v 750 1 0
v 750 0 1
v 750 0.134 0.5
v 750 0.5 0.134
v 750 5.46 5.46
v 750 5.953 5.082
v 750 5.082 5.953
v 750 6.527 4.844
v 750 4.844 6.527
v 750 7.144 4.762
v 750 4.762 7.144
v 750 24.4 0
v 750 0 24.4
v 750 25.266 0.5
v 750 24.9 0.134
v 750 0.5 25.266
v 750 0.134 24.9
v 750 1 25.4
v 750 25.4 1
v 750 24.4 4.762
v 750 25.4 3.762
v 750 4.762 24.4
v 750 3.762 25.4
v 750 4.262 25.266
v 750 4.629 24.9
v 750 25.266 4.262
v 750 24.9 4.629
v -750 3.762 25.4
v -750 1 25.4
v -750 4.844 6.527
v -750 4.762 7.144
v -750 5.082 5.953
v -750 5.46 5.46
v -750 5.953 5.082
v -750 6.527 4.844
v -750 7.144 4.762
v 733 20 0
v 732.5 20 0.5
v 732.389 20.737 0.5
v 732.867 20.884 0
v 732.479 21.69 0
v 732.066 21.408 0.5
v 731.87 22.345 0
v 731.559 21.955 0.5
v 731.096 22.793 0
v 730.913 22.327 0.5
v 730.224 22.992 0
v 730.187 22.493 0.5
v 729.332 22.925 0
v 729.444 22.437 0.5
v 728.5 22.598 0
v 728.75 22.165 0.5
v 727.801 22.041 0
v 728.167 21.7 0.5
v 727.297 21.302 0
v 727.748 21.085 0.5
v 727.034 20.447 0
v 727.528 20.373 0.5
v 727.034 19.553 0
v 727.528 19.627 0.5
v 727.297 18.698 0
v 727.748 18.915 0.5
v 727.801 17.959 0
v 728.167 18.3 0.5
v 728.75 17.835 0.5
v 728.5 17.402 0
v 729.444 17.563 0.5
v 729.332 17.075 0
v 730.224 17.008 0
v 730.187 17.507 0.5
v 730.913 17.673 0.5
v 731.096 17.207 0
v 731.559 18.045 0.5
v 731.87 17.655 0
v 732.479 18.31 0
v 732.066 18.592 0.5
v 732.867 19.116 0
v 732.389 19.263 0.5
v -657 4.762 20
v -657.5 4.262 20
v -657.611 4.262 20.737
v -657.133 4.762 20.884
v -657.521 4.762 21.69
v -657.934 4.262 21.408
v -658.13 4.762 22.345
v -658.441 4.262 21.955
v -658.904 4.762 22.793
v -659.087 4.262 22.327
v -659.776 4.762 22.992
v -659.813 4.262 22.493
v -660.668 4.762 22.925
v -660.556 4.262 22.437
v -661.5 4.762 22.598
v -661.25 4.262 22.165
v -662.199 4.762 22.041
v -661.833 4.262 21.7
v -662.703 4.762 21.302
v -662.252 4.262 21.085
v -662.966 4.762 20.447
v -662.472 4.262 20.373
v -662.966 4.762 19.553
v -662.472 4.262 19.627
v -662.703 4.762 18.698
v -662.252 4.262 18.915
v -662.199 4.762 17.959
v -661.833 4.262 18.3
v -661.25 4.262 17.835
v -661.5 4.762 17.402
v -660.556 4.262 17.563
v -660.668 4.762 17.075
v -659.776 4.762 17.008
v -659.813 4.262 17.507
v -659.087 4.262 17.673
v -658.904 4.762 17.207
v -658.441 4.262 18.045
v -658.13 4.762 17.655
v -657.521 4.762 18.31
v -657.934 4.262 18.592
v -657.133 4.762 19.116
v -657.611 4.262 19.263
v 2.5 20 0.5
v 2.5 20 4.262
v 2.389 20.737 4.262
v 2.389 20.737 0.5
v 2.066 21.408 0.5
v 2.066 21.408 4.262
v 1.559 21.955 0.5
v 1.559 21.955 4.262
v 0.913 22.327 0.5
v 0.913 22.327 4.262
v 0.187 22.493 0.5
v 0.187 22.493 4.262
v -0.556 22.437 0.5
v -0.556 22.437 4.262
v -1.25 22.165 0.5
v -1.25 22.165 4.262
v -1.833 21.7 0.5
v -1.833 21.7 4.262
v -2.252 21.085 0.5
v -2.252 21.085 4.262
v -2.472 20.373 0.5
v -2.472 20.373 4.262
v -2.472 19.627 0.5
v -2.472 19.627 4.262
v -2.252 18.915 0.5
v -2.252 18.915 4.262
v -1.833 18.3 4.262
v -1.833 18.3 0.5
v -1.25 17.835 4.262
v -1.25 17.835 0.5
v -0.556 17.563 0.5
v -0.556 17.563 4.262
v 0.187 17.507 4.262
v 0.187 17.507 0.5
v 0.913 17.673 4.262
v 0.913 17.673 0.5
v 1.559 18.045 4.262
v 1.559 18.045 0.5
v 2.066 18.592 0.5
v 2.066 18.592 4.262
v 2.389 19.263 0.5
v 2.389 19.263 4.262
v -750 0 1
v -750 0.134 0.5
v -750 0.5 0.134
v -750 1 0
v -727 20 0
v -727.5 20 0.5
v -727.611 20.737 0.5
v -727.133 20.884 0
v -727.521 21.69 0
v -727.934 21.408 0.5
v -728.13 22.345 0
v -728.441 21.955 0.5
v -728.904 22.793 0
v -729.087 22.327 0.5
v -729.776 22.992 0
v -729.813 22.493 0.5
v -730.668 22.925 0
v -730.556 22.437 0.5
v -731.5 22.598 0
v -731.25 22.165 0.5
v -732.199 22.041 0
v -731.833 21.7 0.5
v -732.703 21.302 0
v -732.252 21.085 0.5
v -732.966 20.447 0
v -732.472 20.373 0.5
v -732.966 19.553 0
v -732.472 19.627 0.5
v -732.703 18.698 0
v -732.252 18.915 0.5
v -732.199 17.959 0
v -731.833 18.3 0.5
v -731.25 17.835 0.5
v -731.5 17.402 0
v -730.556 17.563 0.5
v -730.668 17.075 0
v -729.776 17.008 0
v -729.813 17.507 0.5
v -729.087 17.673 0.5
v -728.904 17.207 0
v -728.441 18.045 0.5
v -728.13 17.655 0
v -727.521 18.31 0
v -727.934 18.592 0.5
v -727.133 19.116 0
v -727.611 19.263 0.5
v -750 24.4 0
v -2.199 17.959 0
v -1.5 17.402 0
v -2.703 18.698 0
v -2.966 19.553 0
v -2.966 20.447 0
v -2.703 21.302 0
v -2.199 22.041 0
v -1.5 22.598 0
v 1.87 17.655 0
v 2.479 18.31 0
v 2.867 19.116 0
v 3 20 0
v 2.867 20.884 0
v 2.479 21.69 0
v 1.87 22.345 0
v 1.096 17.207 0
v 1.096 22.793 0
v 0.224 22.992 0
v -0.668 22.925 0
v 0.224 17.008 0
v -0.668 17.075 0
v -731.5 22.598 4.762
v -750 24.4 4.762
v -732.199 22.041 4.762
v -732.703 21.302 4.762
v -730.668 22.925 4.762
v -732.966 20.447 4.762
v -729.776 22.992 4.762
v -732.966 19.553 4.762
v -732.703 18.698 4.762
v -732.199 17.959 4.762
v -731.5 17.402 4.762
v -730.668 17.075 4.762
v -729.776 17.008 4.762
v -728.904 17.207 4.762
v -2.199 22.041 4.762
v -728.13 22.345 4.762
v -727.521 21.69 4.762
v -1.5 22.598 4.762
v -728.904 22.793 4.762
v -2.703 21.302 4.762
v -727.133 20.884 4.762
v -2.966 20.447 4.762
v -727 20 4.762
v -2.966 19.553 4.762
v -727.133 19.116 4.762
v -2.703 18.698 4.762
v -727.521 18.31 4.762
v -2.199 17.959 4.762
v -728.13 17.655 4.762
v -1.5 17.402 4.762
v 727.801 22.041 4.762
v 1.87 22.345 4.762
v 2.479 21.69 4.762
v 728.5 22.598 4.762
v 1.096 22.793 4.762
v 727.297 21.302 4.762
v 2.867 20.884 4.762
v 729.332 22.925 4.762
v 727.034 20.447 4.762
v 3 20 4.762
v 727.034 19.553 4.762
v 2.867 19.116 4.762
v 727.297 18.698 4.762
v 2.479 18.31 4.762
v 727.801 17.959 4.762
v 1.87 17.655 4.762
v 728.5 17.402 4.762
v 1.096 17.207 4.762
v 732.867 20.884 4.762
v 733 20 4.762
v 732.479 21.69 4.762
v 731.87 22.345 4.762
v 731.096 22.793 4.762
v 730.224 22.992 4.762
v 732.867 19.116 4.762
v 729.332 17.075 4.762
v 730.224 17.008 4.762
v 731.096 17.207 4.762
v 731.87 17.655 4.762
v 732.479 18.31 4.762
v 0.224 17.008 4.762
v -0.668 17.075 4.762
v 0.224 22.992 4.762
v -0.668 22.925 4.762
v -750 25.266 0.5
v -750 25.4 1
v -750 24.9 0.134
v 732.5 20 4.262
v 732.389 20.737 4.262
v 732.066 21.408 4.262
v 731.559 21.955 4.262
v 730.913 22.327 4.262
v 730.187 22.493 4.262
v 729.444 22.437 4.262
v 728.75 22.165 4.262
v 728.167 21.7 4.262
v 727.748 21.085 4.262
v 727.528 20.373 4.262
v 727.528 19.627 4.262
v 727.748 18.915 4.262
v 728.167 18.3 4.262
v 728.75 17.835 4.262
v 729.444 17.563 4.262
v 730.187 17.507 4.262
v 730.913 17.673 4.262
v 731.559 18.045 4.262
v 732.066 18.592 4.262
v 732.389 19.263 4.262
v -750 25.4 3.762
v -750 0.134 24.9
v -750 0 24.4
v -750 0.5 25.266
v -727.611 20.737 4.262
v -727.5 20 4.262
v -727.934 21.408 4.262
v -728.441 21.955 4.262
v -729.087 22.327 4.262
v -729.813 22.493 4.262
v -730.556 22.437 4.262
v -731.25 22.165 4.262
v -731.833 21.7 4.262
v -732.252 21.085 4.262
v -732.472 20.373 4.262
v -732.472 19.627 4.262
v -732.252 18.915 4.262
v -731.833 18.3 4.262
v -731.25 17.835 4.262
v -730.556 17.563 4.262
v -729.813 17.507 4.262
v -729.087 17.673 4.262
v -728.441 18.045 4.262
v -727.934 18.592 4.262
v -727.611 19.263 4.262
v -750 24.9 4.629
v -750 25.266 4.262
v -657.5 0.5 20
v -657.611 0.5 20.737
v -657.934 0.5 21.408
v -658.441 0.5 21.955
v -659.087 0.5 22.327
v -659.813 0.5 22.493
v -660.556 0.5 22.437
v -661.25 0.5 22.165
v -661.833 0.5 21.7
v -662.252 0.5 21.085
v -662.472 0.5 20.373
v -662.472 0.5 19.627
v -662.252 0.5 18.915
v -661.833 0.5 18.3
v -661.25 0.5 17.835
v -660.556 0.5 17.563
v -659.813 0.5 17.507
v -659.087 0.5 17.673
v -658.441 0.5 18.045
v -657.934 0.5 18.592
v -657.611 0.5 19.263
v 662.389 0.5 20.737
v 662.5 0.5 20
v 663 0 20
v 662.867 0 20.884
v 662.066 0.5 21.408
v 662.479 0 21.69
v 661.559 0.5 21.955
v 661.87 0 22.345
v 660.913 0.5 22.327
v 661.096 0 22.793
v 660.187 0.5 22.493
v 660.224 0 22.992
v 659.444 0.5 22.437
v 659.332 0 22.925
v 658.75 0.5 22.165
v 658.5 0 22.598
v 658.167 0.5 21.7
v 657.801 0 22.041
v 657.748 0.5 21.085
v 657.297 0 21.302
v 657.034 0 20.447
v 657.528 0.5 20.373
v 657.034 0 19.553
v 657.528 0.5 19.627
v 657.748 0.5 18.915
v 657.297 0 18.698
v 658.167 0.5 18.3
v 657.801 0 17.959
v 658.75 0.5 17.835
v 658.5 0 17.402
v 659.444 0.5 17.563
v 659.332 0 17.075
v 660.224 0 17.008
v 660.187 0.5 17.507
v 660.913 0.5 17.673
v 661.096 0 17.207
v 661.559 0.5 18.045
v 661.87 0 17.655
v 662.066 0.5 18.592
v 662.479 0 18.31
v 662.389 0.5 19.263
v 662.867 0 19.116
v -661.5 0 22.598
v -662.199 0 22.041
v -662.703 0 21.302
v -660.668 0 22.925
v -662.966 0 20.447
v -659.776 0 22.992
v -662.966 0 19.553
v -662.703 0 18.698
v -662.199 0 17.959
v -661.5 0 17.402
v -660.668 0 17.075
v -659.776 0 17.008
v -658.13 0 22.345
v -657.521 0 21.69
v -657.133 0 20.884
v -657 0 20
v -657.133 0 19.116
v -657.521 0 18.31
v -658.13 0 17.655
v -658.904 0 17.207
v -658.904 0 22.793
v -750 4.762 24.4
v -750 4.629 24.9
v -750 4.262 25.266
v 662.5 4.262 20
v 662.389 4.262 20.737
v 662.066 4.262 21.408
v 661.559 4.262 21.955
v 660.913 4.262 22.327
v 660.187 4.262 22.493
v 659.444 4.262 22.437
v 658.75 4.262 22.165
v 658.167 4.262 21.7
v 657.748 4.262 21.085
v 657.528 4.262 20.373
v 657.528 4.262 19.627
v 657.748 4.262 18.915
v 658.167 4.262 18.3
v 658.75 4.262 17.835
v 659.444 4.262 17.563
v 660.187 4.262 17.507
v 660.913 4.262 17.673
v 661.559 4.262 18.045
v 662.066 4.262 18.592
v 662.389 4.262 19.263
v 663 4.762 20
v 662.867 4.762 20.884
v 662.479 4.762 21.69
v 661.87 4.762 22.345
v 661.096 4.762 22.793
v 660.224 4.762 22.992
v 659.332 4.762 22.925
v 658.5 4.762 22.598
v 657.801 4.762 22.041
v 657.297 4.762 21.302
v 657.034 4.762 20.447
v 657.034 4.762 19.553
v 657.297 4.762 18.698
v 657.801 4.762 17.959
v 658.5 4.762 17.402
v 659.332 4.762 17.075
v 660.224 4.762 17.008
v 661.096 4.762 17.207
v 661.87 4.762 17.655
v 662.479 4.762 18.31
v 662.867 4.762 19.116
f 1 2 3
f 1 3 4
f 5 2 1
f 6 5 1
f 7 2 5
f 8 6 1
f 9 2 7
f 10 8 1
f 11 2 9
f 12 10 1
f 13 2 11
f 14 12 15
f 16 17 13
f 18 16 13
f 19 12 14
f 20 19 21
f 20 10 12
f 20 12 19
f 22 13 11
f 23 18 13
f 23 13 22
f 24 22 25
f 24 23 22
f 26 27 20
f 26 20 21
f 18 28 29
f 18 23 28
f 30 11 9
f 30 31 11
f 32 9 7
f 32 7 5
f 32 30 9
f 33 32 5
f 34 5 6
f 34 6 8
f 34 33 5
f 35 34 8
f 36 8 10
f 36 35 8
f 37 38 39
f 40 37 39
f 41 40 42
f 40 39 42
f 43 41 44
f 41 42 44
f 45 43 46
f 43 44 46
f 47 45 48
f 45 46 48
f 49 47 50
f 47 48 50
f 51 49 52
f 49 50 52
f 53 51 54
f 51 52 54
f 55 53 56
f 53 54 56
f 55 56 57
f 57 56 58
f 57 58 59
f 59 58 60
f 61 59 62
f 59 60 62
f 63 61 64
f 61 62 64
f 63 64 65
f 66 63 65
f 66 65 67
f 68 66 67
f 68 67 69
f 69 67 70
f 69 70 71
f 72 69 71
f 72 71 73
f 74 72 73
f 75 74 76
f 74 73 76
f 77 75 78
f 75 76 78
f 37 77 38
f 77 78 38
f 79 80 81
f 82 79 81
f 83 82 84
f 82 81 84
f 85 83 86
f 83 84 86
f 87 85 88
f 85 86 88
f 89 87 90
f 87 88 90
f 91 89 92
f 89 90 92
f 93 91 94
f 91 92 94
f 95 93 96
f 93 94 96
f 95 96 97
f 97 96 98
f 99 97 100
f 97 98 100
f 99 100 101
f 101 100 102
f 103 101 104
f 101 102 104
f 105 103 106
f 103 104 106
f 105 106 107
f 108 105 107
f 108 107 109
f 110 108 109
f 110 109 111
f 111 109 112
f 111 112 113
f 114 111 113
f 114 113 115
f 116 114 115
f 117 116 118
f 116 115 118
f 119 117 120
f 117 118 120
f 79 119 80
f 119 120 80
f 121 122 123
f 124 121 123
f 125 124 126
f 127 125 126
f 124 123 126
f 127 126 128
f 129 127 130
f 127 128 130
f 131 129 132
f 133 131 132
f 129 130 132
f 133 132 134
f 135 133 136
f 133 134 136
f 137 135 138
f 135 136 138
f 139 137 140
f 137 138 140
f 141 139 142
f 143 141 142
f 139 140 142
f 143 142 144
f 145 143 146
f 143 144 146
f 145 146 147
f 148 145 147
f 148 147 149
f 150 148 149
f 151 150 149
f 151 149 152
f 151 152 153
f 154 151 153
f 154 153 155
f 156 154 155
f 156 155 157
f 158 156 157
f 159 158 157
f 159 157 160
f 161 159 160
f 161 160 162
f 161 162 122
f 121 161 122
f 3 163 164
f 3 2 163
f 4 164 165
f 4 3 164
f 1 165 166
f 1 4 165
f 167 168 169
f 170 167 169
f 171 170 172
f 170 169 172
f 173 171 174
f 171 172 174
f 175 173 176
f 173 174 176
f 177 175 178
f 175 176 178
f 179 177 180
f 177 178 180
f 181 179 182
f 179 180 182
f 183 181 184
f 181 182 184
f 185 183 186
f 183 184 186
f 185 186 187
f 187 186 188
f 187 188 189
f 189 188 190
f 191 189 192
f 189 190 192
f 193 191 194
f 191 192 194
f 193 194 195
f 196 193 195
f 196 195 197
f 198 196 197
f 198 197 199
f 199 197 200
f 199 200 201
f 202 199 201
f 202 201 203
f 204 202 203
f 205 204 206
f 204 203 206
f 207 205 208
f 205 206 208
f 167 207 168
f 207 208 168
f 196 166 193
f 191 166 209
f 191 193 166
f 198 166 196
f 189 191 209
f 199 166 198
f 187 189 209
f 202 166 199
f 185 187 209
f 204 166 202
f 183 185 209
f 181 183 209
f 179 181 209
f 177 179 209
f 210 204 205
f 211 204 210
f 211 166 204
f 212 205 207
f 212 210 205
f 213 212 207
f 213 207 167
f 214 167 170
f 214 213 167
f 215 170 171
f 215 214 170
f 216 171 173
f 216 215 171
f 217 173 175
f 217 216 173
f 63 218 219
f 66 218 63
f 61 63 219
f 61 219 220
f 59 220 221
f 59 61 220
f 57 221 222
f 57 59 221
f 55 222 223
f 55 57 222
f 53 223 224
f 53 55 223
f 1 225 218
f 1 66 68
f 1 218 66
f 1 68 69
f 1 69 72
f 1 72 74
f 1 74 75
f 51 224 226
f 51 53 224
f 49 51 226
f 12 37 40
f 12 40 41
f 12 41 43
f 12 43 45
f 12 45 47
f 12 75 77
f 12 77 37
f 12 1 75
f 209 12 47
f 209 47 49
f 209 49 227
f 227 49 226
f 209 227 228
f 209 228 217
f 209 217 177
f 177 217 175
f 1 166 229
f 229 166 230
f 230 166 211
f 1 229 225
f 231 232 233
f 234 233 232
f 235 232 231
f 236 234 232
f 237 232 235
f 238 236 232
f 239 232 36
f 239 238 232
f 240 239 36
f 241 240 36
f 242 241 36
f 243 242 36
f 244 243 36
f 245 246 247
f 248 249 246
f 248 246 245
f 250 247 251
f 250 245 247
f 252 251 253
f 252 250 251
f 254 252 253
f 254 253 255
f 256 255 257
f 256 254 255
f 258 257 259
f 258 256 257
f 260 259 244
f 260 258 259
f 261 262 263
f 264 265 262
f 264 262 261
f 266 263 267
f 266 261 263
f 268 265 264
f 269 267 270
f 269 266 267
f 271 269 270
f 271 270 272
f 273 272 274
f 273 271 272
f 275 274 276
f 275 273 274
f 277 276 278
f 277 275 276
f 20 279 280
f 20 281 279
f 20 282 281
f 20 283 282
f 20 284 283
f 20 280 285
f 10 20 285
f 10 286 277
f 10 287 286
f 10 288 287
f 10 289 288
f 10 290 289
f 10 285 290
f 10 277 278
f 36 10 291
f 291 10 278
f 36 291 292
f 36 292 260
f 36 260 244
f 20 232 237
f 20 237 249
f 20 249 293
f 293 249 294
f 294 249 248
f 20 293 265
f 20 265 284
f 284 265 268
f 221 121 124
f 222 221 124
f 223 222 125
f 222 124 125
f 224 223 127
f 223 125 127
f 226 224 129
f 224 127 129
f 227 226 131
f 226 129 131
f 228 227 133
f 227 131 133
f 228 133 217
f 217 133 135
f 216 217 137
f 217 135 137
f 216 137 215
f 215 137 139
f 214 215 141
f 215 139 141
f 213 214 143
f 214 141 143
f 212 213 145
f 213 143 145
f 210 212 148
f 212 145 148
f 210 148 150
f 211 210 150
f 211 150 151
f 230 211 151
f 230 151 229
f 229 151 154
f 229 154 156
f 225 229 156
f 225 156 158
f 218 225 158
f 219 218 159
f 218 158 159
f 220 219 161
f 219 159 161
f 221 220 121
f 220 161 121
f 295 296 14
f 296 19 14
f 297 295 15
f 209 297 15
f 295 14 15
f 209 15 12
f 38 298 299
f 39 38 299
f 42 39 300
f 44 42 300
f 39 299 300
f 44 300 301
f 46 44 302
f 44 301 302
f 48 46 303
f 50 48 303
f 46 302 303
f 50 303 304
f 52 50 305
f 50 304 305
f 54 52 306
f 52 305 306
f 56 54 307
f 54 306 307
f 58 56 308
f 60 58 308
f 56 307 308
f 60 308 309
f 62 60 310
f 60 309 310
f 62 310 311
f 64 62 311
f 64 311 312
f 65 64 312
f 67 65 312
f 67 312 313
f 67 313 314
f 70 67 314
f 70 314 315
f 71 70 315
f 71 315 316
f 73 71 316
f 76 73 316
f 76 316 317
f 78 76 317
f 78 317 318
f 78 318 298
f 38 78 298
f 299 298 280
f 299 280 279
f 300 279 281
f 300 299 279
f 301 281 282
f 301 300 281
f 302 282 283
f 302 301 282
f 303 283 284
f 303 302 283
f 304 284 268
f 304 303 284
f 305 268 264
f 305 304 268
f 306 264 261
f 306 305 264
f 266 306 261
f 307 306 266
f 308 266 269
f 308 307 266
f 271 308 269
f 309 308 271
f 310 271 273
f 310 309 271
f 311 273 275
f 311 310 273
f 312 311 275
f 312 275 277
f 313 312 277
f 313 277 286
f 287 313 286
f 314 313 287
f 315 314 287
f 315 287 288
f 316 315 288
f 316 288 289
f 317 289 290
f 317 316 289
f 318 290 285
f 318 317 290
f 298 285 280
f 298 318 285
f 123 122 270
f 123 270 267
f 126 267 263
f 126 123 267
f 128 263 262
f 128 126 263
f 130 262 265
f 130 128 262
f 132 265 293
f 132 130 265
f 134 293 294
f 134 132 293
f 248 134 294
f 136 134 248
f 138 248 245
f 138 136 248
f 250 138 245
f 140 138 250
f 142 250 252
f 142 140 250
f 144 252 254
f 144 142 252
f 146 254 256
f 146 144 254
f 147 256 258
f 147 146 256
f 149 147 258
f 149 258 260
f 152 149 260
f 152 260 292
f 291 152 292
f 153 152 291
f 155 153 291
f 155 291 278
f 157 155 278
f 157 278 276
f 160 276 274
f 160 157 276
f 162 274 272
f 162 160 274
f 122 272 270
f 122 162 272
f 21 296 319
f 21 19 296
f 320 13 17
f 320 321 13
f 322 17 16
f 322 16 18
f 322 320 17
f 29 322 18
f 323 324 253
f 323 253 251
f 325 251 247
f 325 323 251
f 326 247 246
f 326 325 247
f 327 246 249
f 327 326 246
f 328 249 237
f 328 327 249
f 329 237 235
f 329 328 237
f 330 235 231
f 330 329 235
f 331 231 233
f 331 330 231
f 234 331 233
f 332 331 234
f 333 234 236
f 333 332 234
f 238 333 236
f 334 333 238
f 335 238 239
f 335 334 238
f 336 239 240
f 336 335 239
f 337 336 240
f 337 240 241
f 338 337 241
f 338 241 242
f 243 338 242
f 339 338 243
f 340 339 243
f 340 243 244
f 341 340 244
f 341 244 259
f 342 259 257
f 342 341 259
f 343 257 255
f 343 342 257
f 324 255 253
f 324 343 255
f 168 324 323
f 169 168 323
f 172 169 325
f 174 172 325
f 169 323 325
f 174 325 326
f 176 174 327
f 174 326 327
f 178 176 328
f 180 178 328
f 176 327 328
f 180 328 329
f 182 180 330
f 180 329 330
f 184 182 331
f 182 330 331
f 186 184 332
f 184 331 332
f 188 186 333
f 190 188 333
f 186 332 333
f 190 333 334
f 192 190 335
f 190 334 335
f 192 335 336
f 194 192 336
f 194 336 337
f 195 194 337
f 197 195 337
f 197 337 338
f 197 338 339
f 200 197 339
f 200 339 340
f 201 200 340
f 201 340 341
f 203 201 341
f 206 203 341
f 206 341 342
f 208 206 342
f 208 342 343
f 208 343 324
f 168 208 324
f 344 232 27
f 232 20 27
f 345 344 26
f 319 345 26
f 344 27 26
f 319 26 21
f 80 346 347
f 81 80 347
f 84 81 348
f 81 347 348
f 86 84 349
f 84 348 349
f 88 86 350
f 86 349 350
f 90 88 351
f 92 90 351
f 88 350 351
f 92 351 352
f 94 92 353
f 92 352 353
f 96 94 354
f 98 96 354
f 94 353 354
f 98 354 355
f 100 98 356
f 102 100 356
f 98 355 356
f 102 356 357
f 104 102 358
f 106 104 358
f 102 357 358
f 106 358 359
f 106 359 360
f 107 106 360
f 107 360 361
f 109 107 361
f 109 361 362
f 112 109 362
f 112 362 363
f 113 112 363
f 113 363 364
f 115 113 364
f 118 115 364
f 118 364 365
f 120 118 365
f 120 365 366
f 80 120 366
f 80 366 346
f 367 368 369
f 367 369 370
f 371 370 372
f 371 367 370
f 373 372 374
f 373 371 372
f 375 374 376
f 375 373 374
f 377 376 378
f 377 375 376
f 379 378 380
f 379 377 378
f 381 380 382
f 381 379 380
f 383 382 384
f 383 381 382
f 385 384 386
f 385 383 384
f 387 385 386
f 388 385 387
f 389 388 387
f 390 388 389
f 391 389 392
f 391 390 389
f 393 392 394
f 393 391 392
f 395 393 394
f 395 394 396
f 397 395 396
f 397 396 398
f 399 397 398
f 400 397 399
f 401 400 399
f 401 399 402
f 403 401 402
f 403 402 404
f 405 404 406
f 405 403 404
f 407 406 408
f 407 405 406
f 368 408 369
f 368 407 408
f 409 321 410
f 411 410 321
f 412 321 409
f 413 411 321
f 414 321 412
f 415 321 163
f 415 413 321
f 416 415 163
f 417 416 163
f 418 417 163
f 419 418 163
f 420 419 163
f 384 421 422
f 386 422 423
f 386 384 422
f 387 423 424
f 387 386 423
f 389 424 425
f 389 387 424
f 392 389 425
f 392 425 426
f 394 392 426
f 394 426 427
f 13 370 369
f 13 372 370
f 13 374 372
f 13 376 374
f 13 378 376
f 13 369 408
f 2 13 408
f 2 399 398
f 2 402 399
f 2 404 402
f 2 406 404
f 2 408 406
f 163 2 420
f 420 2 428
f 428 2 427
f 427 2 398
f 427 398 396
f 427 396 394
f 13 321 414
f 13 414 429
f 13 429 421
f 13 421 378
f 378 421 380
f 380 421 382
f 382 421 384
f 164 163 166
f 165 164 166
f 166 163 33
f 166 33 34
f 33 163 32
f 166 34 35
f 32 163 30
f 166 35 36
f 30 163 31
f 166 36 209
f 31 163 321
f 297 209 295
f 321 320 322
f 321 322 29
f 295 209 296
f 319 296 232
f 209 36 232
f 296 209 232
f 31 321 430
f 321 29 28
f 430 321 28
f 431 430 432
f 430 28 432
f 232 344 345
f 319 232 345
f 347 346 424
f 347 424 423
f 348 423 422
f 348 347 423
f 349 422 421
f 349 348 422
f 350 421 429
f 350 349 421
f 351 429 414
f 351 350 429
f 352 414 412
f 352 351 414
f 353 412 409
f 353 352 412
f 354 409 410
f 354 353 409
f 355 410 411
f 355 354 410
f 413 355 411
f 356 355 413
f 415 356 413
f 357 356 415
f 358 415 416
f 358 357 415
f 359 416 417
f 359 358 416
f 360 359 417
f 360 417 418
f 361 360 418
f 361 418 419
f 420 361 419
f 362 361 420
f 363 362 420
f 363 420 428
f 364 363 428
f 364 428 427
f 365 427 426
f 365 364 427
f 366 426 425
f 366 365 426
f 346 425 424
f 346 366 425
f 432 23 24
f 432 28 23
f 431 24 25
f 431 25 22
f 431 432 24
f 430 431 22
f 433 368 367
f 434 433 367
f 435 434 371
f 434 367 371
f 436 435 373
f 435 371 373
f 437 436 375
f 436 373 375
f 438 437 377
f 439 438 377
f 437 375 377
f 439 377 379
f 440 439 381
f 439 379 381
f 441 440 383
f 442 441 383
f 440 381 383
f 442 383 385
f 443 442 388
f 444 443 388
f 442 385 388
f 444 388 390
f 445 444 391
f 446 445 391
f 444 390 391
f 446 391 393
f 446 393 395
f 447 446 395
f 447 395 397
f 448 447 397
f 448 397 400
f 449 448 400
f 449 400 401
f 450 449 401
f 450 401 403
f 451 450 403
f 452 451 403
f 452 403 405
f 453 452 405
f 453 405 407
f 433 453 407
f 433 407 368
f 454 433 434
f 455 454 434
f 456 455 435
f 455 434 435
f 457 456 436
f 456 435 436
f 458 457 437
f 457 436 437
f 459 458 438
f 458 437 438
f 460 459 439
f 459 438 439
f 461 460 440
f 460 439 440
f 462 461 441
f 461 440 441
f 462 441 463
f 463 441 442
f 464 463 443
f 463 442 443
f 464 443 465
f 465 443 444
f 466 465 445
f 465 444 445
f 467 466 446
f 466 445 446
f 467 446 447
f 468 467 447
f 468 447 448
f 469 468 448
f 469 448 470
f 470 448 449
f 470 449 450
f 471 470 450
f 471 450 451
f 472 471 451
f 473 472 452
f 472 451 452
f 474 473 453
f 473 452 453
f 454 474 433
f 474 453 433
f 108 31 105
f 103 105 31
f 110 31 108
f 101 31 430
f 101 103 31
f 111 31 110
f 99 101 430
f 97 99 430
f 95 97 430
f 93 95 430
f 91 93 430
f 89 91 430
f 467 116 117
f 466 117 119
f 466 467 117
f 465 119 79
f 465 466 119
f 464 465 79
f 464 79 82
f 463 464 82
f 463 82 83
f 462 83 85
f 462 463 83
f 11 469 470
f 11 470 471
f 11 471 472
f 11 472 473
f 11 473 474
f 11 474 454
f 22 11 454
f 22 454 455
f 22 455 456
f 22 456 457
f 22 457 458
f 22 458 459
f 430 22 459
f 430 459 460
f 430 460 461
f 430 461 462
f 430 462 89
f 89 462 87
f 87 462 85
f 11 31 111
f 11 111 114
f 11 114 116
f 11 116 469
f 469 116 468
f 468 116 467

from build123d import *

# Parameters (mm, degrees)
F1_DEPTH = 750
F2_R     = 1
F3_R     = 2.38125
F4_R     = 2.5
F5_DEPTH = 25
F6_SIZE  = 0.5
F7_R     = 2.5
F8_DEPTH = 25
F9_SIZE  = 0.5


with BuildPart() as f1:
    # F0 (on Right) → F1 (new body, symmetric)
    with BuildSketch(Plane.YZ):
        Polygon((0, 25.4), (0, 0), (25.4, 0), (25.4, 4.7625), (4.7625, 4.7625), (4.7625, 25.4), align=None)
    extrude(amount=F1_DEPTH, both=True)

    # F2
    f2_edges = [f1.edges().sort_by_distance(p)[0] for p in [
        (0, 0, 25.4),
        (0, 4.7625, 25.4),
        (0, 0, 0),
        (0, 25.4, 4.7625),
        (0, 25.4, 0),
    ]]
    fillet(f2_edges, radius=F2_R)

    # F3
    f3_edges = [f1.edges().sort_by_distance(p)[0] for p in [
        (0, 4.7625, 4.7625),
    ]]
    fillet(f3_edges, radius=F3_R)

    # F4 (on face) → F5 (cut)
    with BuildSketch(Plane.XY.offset(4.7625)):
        with Locations((-730, 20)):
            Circle(F4_R)
        with Locations((0, 20)):
            Circle(F4_R)
        with Locations((730, 20)):
            Circle(F4_R)
    extrude(amount=-F5_DEPTH, mode=Mode.SUBTRACT)

    # F6
    f6_edges = [f1.edges().sort_by_distance(p)[0] for p in [
        (-732.5, 20, 4.7625),
        (-727.5, 20, 2.38125),
        (-732.5, 20, 0),
        (-2.5, 20, 4.7625),
        (2.5, 20, 2.38125),
        (-2.5, 20, 0),
        (727.5, 20, 4.7625),
        (732.5, 20, 2.38125),
        (727.5, 20, 0),
    ]]
    chamfer(f6_edges, length=F6_SIZE)

    # F7 (on face) → F8 (cut)
    with BuildSketch(Plane.XZ):
        with Locations((-660, 20)):
            Circle(F7_R)
        with Locations((660, 20)):
            Circle(F7_R)
    extrude(amount=-F8_DEPTH, mode=Mode.SUBTRACT)

    # F9
    f9_edges = [f1.edges().sort_by_distance(p)[0] for p in [
        (-662.5, 0, 20),
        (-657.5, 2.38125, 20),
        (-662.5, 4.7625, 20),
        (657.5, 0, 20),
        (662.5, 2.38125, 20),
        (657.5, 4.7625, 20),
    ]]
    chamfer(f9_edges, length=F9_SIZE)


solid = f1.part
